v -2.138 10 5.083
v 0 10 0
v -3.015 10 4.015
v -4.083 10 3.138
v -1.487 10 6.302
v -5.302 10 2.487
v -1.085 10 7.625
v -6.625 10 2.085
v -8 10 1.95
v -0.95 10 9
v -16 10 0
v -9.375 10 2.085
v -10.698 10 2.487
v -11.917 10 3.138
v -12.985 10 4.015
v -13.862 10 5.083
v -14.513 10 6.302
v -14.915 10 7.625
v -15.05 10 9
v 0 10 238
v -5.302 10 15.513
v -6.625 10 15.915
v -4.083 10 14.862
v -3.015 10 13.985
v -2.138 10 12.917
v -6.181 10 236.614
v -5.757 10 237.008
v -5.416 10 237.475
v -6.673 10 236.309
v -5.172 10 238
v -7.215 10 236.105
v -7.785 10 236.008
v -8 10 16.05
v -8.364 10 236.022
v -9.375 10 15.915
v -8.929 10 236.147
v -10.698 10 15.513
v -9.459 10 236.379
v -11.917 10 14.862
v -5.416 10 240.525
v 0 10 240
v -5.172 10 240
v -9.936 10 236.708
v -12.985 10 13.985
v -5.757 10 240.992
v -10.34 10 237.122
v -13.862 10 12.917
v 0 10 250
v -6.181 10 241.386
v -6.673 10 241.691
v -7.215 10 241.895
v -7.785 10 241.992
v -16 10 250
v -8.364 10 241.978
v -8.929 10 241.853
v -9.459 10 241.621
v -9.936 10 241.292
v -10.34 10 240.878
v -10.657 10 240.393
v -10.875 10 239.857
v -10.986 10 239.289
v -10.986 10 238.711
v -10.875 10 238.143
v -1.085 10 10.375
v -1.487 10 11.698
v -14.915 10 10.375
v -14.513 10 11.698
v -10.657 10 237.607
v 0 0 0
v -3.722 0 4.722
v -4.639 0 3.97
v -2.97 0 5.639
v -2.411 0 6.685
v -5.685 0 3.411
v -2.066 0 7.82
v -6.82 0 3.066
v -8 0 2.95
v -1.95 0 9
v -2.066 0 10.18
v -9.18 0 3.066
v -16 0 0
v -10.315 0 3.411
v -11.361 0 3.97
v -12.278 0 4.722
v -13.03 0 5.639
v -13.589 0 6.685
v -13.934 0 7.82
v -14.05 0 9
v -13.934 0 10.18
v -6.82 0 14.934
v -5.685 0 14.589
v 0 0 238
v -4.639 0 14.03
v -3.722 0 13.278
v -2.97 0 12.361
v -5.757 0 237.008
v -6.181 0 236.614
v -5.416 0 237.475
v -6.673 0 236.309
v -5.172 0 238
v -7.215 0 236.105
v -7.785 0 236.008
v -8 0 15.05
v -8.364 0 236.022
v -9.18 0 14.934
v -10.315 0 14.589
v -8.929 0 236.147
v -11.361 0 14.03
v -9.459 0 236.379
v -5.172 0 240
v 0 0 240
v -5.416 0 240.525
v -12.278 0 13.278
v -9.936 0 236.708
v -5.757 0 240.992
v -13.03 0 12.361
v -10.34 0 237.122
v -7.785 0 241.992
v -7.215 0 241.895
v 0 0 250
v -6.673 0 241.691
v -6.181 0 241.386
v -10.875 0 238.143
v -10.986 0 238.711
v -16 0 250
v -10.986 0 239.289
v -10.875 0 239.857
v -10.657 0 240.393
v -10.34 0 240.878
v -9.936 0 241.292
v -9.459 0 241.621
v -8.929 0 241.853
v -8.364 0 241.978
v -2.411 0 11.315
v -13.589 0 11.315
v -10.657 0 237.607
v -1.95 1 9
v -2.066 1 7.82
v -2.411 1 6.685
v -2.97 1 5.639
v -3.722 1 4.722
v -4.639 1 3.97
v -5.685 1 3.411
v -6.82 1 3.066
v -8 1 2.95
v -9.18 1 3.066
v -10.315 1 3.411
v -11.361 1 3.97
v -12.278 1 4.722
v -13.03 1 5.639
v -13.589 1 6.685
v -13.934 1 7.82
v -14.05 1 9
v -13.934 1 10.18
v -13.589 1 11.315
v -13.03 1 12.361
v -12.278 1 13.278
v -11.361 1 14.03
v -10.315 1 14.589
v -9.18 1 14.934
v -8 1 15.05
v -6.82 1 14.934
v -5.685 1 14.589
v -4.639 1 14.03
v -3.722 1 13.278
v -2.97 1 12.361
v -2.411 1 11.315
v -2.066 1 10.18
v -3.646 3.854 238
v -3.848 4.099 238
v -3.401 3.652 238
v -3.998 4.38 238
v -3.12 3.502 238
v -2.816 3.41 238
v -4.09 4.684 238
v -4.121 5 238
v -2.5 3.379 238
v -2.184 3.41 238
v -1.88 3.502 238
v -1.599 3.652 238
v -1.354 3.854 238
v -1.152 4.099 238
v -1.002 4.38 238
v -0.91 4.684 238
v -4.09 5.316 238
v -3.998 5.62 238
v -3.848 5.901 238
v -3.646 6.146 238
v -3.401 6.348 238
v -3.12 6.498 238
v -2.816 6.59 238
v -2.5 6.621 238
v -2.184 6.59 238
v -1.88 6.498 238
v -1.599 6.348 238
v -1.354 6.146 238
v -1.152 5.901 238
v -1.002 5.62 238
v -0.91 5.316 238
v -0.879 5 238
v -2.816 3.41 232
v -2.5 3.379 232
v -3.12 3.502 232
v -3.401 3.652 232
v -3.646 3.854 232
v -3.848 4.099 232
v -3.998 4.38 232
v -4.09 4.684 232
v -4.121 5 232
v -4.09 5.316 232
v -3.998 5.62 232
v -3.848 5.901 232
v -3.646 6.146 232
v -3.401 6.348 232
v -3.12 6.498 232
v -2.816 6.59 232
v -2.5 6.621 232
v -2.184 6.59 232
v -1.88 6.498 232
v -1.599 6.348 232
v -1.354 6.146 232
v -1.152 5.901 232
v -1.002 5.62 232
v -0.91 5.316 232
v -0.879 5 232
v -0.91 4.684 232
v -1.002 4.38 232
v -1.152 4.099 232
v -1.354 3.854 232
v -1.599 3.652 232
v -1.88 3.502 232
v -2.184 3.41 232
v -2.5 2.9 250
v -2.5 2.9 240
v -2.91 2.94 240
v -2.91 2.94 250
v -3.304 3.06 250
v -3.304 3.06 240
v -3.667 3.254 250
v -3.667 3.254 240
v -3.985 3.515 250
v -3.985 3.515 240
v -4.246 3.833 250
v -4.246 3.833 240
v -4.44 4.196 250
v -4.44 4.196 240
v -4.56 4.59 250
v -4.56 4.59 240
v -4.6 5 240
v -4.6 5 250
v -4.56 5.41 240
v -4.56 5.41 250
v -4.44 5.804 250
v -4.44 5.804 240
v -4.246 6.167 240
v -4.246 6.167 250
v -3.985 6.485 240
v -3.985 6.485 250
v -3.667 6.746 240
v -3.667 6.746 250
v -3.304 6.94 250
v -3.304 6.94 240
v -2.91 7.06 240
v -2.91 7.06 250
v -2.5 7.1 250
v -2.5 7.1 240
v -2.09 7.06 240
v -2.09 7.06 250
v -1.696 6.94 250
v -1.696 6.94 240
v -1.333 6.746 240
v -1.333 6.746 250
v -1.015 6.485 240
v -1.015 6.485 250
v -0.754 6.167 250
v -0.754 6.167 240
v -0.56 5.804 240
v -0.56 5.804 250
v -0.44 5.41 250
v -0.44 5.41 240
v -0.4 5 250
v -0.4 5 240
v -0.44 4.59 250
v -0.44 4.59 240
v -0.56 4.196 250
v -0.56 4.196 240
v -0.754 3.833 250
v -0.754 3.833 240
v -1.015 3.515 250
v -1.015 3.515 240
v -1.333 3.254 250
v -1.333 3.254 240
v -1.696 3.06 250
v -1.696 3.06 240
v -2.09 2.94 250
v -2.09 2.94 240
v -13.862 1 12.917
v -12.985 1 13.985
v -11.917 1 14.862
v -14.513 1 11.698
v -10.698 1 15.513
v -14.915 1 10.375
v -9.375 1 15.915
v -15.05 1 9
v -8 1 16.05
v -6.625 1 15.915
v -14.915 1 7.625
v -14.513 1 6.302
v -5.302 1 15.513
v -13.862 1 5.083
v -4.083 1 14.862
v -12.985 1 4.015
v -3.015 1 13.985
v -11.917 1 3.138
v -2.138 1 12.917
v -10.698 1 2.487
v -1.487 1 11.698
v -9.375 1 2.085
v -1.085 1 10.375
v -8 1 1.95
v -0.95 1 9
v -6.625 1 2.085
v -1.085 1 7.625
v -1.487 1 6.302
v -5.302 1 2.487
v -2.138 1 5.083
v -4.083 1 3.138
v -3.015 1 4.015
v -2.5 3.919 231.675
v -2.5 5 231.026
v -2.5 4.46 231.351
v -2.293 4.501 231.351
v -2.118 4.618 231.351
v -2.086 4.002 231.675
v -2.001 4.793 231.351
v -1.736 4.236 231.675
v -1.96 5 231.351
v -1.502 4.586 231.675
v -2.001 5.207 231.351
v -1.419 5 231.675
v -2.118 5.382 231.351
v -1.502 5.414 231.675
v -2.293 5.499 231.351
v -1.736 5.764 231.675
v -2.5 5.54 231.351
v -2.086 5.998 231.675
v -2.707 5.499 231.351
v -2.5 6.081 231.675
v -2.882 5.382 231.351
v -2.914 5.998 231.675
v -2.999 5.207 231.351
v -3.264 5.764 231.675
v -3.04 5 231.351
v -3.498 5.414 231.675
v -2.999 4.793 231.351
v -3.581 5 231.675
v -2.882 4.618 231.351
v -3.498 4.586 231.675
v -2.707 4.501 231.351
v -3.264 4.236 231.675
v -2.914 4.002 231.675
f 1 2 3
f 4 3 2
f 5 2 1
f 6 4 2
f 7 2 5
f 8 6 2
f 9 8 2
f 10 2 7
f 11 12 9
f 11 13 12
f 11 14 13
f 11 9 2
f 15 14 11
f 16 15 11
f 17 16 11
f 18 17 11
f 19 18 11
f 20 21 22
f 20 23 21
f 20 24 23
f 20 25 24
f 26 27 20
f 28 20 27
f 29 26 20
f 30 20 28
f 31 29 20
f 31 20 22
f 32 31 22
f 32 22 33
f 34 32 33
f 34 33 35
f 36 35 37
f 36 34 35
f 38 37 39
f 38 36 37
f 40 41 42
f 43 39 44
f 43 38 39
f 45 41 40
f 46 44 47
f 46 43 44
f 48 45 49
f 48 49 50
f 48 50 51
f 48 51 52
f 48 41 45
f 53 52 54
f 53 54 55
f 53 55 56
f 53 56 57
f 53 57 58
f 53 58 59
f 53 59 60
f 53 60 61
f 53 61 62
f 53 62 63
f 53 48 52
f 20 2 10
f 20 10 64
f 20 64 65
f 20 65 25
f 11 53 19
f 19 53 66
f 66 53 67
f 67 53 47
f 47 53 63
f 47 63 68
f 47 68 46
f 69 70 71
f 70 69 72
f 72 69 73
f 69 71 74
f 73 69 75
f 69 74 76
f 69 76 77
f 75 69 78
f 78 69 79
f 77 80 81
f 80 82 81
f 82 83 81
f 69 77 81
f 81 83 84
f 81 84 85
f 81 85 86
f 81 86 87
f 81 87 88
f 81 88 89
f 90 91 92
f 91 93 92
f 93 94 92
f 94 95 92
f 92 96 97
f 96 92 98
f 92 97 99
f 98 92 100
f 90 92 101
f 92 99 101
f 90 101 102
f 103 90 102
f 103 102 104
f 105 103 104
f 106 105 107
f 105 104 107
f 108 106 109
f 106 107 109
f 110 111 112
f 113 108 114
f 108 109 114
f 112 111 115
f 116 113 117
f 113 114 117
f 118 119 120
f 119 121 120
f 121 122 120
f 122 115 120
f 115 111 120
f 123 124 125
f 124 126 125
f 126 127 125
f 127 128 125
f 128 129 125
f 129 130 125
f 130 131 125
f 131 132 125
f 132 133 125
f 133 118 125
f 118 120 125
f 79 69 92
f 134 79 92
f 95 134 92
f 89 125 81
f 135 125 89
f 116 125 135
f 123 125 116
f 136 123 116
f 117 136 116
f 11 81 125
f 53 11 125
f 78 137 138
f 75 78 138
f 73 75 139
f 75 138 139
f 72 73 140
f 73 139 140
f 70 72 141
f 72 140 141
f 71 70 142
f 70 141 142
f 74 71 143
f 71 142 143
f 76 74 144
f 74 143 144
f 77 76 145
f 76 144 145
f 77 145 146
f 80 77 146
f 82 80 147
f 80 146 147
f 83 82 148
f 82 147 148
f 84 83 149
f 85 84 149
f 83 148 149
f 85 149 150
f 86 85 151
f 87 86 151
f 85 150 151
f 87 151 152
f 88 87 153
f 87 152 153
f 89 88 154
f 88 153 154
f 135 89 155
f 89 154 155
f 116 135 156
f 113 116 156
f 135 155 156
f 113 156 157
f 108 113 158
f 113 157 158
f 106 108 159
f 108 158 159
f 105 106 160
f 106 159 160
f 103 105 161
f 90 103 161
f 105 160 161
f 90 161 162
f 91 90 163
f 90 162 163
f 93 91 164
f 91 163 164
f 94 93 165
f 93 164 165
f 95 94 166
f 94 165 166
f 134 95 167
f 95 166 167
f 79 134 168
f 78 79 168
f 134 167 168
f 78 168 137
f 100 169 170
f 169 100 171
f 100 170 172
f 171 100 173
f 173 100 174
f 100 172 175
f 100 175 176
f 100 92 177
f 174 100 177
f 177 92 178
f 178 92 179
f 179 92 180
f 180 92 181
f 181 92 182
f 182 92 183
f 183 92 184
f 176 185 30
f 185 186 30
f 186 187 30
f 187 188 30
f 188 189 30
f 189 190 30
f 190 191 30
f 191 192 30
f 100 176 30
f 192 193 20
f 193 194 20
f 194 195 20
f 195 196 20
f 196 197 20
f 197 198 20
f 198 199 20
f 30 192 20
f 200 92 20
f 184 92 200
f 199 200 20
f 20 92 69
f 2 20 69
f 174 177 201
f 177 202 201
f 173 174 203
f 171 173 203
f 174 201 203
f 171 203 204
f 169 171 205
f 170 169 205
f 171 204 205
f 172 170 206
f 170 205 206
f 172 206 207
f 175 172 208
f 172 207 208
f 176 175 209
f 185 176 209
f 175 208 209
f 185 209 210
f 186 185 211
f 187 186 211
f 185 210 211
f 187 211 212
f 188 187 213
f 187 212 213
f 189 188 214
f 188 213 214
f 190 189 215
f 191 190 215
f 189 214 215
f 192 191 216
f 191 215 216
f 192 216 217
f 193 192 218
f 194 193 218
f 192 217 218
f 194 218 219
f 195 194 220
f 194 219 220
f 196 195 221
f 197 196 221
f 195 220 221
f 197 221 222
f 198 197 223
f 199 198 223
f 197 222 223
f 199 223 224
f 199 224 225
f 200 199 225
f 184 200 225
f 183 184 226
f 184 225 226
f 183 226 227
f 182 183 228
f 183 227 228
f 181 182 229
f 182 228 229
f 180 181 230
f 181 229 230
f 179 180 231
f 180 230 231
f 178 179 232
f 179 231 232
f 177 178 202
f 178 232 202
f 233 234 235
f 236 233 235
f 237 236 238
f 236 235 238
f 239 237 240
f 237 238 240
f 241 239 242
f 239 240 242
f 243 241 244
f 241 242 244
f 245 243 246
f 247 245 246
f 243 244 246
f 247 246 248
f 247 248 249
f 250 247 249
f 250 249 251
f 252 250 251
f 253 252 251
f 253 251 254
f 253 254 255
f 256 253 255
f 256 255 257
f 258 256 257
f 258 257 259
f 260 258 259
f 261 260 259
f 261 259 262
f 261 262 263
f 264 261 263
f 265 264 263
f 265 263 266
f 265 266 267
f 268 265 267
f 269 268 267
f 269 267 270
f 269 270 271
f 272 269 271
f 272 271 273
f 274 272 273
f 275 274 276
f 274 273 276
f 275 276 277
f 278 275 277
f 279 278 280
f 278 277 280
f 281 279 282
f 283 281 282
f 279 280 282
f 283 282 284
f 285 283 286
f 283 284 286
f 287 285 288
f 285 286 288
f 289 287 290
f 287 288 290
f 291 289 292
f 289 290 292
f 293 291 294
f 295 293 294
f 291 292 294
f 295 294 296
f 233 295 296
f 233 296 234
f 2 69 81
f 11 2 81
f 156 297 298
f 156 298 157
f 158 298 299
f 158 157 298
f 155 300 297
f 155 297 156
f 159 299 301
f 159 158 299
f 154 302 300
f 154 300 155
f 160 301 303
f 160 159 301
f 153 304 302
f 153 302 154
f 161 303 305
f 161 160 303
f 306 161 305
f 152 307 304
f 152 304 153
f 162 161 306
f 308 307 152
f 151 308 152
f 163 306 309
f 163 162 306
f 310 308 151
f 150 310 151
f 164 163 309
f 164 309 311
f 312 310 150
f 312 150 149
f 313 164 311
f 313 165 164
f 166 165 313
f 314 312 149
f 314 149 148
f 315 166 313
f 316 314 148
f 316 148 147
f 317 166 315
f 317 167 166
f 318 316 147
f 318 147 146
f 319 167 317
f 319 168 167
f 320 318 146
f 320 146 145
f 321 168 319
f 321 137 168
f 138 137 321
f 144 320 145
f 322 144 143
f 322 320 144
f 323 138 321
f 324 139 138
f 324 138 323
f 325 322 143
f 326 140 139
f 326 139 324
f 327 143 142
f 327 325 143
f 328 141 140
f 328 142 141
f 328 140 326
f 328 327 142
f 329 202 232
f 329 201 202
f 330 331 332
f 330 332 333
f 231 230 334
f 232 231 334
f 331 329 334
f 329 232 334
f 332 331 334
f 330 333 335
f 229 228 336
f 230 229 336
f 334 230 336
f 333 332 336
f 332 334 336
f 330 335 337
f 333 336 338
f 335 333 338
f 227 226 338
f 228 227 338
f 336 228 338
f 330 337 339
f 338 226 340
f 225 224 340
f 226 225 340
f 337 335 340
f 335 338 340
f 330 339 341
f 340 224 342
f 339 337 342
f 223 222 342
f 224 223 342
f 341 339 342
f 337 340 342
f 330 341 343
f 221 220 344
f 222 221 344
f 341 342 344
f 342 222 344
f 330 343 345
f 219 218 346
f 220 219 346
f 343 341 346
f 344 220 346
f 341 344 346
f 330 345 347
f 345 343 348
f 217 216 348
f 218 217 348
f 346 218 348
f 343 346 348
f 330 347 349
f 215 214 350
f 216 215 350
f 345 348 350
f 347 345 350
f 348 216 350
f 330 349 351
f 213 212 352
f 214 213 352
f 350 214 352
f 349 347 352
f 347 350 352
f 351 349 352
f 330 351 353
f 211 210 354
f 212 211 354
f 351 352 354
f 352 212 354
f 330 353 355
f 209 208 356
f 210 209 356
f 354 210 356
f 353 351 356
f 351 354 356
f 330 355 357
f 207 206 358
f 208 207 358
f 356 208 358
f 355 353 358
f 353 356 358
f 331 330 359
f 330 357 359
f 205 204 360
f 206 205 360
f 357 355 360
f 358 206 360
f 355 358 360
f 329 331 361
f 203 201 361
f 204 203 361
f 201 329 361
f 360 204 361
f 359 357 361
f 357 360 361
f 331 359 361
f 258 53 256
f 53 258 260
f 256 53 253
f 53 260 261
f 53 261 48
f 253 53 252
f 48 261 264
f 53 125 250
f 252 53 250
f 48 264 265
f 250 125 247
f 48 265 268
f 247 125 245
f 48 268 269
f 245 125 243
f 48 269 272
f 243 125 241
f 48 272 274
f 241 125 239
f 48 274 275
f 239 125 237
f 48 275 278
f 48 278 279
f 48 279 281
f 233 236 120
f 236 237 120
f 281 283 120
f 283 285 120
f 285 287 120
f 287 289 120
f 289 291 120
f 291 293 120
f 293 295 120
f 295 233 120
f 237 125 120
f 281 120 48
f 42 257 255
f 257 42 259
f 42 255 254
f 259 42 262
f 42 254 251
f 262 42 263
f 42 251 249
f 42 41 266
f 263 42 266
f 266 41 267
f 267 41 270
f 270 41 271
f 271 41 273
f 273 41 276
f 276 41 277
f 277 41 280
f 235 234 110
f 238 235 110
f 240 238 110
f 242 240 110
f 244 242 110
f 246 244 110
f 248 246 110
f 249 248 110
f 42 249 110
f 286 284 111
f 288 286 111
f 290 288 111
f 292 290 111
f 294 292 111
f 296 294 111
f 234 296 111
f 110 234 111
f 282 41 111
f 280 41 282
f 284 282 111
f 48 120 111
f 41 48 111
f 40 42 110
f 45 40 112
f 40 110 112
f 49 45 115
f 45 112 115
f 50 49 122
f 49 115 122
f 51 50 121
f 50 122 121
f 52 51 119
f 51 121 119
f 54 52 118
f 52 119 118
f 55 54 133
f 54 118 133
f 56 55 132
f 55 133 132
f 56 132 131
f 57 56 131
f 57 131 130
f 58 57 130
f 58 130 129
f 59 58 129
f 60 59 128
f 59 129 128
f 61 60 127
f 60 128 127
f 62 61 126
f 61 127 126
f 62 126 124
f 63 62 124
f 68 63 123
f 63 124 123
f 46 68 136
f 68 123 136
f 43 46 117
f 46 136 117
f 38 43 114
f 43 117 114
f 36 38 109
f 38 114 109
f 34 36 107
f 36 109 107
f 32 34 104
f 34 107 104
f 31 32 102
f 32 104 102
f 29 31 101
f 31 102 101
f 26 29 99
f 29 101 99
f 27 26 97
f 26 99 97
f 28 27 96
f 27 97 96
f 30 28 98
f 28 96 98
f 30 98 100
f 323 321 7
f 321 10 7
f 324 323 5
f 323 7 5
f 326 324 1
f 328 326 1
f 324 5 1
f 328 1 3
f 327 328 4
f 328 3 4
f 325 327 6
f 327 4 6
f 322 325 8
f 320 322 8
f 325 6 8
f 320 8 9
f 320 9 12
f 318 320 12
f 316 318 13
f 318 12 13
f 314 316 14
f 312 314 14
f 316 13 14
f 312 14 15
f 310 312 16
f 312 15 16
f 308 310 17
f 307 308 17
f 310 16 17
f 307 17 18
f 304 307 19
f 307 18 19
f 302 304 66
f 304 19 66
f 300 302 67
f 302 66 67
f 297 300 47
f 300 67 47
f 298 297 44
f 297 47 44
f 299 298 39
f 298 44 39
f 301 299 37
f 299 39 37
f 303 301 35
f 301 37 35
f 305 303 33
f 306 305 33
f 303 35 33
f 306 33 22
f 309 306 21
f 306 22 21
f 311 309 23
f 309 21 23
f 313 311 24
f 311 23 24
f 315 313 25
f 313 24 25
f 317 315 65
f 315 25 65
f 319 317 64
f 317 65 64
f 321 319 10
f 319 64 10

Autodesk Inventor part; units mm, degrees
ref_plane "YZ Plane" through (0, 0, 0) normal (1, 0, 0) x (0, 1, 0)
ref_plane "XZ Plane" through (0, 0, 0) normal (0, 1, 0) x (-1, 0, 0)
ref_plane "XY Plane" through (0, 0, 0) normal (0, 0, 1) x (1, 0, 0)
sketch "Skizze2" plane through (0, 0, 0) normal (0, 1, 0) x (-1, 0, 0)
  line L0 (0, 0) -> (16, 0)
  line L1 (16, 0) -> (16, 250)
  line L2 (16, 250) -> (0, 250)
  line L3 (0, 250) -> (0, 0)
  dimension "d0" = 16
  dimension "d1" = 250
extrude "Extrusion1" add sketch "Skizze2" along normal blind 10
sketch "Skizze3" plane through (0, 0, 250) normal (1, 0, 0) x (0, 0, -1)
  line L0 (250, 0) -> (0, 0) projected
  line L1 (250, 10) -> (0, 10) projected
  line L2 (10, 0) -> (12, 0)
  line L3 (12, 0) -> (12, 10)
  line L4 (12, 10) -> (10, 10)
  line L5 (10, 10) -> (10, 0)
  line L6 (0, 0) -> (0, 10) projected
  point P0 (10, 10)
  point P1 (12, 0)
  dimension "d4" = 2
  dimension "d5" = 10
extrude "Extrusion2" cut sketch "Skizze3" against normal blind 7.5 contours L0 L5 L1 L3
sketch "Skizze4" plane through (-16, 0, 250) normal (0, 0, 1) x (1, 0, 0)
  line L0 (0, 0) -> (16, 0) projected
  line L1 (16, 0) -> (16, 10) projected
  point P0 (13.5, 5)
  dimension "d8" = 5
  dimension "d9" = 2.5
hole "Bohrung1" at (-2.5, 5, 250) direction (0, 0, -1) diameter 4.2 depth 12
sketch "Skizze5" plane through (0, 10, 0) normal (0, 1, 0) x (1, 0, 0)
  line L0 (-16, -250) -> (0, -250) projected
  line L1 (-16, 0) -> (-16, -250) projected
  point P0 (0, 0)
  point P1 (-8, -239)
  dimension "d17" = 11
  dimension "d18" = 8
hole "Bohrung2" at (-8, 10, 239) direction (0, -1, 0) diameter 6 depth 18 tip angle 118
sketch "Skizze7" plane through (0, 10, 0) normal (0, 1, 0) x (1, 0, 0)
  circle A0 centre (-8, -9) radius 7.05
  line L0 (0, -238) -> (0, 0) projected
  line L1 (0, 0) -> (-16, 0) projected
  arc A1 (-5.1716, -238) -> (-5.1716, -240) centre (-8, -239) ccw projected
  dimension "d35" = 14.1
  dimension "d36" = 8
  dimension "d43" = 230
extrude "Extrusion3" cut sketch "Skizze7" against normal blind 9
sketch "Skizze9" plane through (0, 10, 0) normal (0, 1, 0) x (1, 0, 0)
  circle A0 centre (-8, -9) radius 7.05 projected
  circle A1 centre (-8, -9) radius 6.05
  point P0 (0, 0)
  dimension "d40" = 12.1
extrude "Extrusion4" cut sketch "Skizze9" against normal through all contours A1
sketch "Skizze10" plane through (-16, 0, 250) normal (0, 0, 1) x (1, 0, 0)
  circle A0 centre (13.5, 5) radius 2.1 projected
  point P0 (16, 0)
hole "Bohrung4" at (-2.5, 5, 250) direction (0, 0, -1) diameter 3.242 depth 18 tip angle 118 thread size "M4x0.7" class "6H" standard "ISO Metric profile"
properties part number "Arm"
